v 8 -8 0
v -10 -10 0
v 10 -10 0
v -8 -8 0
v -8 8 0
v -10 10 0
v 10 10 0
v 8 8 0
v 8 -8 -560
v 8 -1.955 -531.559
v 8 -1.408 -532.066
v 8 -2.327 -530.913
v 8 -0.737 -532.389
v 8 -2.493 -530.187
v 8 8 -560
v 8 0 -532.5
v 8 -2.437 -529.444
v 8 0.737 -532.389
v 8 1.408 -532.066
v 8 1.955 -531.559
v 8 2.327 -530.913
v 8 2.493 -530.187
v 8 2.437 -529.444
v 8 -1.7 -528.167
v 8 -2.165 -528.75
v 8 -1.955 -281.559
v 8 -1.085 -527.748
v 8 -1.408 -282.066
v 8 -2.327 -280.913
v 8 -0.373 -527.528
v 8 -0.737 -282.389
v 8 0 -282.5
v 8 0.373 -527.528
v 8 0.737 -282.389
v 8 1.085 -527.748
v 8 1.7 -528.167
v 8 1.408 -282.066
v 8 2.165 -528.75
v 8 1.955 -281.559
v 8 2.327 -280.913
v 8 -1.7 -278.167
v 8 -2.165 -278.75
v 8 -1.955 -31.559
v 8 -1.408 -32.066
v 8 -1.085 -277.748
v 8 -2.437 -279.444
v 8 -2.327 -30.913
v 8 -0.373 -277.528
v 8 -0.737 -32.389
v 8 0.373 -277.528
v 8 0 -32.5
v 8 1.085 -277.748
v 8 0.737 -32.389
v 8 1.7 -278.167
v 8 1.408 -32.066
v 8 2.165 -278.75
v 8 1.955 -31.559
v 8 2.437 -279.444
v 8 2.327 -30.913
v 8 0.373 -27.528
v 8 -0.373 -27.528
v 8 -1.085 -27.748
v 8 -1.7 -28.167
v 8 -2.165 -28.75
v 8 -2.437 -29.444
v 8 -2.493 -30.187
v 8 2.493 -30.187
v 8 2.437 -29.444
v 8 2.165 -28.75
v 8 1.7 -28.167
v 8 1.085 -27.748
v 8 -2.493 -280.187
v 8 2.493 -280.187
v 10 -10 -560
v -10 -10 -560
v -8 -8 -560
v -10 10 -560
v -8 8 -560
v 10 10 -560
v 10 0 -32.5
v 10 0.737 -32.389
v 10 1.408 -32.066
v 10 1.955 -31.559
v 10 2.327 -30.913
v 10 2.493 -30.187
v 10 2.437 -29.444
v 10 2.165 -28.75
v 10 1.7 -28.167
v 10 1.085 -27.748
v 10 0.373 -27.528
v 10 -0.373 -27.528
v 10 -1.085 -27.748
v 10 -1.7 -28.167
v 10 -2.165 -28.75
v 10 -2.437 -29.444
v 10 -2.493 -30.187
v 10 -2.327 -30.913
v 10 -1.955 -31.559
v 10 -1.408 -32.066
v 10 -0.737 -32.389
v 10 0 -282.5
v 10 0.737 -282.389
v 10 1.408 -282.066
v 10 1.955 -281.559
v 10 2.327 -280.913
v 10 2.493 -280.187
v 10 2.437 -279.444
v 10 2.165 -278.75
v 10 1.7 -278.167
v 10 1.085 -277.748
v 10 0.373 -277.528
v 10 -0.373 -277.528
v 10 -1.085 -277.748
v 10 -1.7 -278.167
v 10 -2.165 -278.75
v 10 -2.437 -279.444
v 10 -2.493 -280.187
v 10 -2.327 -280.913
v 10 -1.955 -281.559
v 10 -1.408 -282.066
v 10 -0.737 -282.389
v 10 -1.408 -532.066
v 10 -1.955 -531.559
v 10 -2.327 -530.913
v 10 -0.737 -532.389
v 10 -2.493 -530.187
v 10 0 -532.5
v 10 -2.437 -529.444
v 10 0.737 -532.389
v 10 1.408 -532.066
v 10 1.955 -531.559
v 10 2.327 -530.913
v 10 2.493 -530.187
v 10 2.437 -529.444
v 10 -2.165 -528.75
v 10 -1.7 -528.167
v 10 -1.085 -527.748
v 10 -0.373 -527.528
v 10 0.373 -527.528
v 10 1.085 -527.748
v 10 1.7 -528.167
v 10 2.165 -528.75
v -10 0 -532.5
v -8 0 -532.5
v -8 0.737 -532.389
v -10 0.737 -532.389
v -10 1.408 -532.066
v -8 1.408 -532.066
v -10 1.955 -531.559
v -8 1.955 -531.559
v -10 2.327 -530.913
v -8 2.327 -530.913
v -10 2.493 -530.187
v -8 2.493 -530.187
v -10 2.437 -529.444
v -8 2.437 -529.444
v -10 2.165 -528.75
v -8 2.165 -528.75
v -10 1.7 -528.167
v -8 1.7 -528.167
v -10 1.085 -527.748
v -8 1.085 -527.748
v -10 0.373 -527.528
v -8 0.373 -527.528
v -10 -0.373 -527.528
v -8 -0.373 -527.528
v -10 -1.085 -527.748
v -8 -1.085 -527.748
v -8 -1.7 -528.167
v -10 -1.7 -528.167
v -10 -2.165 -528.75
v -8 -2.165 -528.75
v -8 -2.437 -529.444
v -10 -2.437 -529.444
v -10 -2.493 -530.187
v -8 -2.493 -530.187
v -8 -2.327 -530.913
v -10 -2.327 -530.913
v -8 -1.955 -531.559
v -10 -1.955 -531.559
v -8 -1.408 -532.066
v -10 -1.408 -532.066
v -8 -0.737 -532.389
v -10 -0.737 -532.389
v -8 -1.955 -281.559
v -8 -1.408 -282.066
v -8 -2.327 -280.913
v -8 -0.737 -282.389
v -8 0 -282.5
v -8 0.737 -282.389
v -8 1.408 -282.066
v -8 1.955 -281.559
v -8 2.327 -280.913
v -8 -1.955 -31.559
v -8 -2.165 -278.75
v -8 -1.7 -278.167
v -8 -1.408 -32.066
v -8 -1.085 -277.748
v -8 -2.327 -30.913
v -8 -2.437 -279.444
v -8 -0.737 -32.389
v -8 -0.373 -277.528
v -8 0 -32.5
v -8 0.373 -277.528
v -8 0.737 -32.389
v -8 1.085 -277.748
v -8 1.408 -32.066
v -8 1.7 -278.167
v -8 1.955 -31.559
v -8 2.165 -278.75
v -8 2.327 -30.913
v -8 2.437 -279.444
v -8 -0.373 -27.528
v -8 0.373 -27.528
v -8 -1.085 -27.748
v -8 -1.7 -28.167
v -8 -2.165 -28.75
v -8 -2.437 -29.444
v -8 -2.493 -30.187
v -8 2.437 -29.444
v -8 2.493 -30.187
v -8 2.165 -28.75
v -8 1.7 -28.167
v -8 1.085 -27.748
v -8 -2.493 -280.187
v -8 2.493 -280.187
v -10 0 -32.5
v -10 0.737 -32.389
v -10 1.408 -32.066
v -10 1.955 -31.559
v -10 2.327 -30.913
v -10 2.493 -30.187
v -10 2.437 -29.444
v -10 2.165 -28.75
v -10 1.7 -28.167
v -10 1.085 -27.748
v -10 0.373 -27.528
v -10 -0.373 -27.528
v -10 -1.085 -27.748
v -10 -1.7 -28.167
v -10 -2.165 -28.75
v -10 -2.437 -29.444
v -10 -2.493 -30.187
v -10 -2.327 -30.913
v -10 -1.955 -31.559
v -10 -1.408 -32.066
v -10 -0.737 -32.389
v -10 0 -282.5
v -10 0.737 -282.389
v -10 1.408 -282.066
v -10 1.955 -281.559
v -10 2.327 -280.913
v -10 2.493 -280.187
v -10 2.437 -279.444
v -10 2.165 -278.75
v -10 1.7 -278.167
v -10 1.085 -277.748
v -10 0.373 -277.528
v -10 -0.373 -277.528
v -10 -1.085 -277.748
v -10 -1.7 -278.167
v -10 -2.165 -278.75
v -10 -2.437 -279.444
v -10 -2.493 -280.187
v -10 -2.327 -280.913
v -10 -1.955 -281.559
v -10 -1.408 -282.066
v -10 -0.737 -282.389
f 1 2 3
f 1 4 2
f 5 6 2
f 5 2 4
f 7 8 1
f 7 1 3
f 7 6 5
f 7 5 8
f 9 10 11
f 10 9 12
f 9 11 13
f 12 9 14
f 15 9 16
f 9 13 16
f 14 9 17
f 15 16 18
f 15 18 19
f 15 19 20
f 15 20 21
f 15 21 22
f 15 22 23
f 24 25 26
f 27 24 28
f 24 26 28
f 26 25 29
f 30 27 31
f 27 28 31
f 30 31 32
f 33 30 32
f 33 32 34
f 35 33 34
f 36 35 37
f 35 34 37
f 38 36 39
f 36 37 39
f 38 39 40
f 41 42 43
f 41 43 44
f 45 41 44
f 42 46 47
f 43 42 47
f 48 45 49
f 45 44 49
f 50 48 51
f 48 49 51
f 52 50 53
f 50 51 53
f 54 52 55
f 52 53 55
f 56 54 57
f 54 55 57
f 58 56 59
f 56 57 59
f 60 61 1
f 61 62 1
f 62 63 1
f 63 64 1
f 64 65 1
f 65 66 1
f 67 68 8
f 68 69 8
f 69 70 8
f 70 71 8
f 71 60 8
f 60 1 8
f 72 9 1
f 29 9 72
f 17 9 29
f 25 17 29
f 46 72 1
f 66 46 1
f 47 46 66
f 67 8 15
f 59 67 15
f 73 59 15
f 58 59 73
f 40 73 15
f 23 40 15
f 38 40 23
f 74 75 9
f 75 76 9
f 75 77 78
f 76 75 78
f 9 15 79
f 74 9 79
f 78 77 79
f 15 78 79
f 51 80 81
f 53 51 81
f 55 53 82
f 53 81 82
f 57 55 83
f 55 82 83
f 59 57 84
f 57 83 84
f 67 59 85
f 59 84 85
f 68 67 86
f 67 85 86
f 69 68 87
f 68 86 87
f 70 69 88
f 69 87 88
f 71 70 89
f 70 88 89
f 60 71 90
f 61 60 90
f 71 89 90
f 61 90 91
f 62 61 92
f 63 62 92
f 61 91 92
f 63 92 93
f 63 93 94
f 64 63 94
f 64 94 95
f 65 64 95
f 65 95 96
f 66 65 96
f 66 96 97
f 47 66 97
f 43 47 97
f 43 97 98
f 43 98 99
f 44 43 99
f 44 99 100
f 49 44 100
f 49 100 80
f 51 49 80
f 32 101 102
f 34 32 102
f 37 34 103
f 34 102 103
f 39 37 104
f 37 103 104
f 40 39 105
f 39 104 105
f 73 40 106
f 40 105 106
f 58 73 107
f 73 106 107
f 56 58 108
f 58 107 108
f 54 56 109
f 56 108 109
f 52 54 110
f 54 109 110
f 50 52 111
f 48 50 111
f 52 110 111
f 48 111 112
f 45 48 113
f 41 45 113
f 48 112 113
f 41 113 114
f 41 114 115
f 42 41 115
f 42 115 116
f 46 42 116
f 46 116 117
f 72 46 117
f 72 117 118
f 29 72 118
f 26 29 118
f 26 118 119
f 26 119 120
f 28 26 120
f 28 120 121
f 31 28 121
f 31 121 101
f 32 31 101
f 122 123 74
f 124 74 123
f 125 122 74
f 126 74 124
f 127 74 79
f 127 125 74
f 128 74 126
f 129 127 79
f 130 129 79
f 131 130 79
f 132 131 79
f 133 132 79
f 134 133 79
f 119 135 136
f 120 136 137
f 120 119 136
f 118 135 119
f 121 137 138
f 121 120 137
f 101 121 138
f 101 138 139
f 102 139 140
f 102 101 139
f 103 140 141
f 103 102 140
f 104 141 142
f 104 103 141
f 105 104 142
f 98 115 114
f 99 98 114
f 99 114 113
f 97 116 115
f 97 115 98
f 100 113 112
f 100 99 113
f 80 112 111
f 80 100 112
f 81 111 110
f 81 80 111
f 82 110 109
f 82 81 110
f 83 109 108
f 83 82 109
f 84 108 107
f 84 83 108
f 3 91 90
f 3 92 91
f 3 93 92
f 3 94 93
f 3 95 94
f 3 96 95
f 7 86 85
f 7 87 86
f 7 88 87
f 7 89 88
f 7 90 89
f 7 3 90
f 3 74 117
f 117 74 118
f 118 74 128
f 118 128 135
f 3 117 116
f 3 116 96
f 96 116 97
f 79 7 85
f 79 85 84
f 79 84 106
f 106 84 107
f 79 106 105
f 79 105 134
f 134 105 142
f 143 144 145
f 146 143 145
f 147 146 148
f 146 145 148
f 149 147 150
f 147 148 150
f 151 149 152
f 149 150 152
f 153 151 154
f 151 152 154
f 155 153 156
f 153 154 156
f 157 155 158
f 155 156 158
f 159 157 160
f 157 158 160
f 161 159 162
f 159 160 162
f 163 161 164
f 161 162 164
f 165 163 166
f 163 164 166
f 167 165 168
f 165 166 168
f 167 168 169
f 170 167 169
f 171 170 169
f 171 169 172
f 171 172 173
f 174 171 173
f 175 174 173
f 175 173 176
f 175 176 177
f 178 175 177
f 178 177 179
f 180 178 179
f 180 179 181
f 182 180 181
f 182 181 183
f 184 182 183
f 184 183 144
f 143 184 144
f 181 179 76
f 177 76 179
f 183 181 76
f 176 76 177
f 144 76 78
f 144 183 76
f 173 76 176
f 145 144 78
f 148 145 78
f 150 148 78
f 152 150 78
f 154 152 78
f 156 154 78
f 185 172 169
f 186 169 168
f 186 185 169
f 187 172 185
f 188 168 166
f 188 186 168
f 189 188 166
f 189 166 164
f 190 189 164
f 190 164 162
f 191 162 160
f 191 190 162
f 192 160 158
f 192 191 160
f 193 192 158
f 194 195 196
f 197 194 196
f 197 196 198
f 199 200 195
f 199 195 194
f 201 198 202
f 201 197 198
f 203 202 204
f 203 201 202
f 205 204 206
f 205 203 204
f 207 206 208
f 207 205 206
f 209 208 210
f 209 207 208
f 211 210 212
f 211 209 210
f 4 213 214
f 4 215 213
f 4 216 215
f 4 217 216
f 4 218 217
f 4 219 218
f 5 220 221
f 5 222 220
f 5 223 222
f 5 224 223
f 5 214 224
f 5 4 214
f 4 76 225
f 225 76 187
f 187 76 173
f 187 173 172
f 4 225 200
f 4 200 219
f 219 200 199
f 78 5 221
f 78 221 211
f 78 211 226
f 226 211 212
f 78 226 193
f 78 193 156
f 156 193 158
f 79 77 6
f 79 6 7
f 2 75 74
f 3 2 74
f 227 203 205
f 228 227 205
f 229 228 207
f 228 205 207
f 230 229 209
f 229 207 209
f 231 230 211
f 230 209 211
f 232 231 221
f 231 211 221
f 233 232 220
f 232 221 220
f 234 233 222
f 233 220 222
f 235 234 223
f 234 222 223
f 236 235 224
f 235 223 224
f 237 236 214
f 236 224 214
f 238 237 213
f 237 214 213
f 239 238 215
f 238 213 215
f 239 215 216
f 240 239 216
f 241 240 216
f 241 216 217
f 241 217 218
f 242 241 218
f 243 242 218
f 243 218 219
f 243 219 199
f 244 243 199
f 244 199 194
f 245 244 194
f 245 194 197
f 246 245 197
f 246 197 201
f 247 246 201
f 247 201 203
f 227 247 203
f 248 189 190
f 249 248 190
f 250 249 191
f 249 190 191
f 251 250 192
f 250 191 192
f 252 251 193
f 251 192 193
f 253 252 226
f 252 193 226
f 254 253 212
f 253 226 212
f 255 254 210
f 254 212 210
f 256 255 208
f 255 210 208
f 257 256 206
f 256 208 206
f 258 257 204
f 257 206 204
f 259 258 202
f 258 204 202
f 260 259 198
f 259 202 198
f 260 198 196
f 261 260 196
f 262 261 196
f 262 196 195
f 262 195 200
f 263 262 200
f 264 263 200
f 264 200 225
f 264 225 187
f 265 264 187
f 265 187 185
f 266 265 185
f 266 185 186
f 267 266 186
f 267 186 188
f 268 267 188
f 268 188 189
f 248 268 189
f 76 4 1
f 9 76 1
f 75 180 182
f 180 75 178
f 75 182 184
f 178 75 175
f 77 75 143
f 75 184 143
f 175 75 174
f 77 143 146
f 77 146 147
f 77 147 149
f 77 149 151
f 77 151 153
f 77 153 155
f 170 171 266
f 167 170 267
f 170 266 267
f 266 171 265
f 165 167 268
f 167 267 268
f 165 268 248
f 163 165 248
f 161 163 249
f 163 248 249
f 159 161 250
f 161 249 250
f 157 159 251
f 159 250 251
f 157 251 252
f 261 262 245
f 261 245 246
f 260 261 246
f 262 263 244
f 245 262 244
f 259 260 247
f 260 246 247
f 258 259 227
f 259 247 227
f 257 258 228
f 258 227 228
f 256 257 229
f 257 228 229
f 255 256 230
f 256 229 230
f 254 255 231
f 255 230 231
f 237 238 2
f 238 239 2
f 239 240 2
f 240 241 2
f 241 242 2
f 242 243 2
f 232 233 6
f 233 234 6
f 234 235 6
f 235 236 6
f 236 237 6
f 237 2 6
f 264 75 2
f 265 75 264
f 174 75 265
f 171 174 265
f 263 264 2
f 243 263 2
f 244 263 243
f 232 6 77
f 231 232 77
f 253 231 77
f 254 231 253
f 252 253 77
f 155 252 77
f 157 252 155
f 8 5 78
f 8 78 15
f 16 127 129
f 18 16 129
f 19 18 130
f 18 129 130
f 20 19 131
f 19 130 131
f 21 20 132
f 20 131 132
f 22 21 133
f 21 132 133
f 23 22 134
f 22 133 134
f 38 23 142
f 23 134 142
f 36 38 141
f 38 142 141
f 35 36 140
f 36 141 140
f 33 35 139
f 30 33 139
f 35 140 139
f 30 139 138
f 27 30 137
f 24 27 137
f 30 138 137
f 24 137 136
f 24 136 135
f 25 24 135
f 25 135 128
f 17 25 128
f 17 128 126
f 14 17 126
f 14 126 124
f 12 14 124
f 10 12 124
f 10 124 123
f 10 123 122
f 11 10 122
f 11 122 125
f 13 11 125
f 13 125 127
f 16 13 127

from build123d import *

# Parameters (mm, degrees)
SKETCH_1_W          = 20
SKETCH_1_H          = 20
SKETCH_1_W_2        = 16
SKETCH_1_H_2        = 16
EXTRUDE_1_DEPTH     = 560
SKETCH_2_R          = 2.5
CUT_EXTRUDE_1_DEPTH = 20


with BuildPart() as part:
    # 草图1 → 凸台-拉伸1 (new body)
    with BuildSketch(Plane.XY):
        Rectangle(SKETCH_1_W, SKETCH_1_H)
        Rectangle(SKETCH_1_W_2, SKETCH_1_H_2, mode=Mode.SUBTRACT)
    extrude(amount=-EXTRUDE_1_DEPTH)

    # 草图2 → 切除-拉伸1 (cut)
    with BuildSketch(Plane(origin=(10, 0, 0), x_dir=(0, 0, -1), z_dir=(1, 0, 0))):
        with Locations((280, 0)):
            Circle(SKETCH_2_R)
        with Locations((30, 0)):
            Circle(SKETCH_2_R)
        with Locations((530, 0)):
            Circle(SKETCH_2_R)
    extrude(amount=-CUT_EXTRUDE_1_DEPTH, mode=Mode.SUBTRACT)


solid = part.part
